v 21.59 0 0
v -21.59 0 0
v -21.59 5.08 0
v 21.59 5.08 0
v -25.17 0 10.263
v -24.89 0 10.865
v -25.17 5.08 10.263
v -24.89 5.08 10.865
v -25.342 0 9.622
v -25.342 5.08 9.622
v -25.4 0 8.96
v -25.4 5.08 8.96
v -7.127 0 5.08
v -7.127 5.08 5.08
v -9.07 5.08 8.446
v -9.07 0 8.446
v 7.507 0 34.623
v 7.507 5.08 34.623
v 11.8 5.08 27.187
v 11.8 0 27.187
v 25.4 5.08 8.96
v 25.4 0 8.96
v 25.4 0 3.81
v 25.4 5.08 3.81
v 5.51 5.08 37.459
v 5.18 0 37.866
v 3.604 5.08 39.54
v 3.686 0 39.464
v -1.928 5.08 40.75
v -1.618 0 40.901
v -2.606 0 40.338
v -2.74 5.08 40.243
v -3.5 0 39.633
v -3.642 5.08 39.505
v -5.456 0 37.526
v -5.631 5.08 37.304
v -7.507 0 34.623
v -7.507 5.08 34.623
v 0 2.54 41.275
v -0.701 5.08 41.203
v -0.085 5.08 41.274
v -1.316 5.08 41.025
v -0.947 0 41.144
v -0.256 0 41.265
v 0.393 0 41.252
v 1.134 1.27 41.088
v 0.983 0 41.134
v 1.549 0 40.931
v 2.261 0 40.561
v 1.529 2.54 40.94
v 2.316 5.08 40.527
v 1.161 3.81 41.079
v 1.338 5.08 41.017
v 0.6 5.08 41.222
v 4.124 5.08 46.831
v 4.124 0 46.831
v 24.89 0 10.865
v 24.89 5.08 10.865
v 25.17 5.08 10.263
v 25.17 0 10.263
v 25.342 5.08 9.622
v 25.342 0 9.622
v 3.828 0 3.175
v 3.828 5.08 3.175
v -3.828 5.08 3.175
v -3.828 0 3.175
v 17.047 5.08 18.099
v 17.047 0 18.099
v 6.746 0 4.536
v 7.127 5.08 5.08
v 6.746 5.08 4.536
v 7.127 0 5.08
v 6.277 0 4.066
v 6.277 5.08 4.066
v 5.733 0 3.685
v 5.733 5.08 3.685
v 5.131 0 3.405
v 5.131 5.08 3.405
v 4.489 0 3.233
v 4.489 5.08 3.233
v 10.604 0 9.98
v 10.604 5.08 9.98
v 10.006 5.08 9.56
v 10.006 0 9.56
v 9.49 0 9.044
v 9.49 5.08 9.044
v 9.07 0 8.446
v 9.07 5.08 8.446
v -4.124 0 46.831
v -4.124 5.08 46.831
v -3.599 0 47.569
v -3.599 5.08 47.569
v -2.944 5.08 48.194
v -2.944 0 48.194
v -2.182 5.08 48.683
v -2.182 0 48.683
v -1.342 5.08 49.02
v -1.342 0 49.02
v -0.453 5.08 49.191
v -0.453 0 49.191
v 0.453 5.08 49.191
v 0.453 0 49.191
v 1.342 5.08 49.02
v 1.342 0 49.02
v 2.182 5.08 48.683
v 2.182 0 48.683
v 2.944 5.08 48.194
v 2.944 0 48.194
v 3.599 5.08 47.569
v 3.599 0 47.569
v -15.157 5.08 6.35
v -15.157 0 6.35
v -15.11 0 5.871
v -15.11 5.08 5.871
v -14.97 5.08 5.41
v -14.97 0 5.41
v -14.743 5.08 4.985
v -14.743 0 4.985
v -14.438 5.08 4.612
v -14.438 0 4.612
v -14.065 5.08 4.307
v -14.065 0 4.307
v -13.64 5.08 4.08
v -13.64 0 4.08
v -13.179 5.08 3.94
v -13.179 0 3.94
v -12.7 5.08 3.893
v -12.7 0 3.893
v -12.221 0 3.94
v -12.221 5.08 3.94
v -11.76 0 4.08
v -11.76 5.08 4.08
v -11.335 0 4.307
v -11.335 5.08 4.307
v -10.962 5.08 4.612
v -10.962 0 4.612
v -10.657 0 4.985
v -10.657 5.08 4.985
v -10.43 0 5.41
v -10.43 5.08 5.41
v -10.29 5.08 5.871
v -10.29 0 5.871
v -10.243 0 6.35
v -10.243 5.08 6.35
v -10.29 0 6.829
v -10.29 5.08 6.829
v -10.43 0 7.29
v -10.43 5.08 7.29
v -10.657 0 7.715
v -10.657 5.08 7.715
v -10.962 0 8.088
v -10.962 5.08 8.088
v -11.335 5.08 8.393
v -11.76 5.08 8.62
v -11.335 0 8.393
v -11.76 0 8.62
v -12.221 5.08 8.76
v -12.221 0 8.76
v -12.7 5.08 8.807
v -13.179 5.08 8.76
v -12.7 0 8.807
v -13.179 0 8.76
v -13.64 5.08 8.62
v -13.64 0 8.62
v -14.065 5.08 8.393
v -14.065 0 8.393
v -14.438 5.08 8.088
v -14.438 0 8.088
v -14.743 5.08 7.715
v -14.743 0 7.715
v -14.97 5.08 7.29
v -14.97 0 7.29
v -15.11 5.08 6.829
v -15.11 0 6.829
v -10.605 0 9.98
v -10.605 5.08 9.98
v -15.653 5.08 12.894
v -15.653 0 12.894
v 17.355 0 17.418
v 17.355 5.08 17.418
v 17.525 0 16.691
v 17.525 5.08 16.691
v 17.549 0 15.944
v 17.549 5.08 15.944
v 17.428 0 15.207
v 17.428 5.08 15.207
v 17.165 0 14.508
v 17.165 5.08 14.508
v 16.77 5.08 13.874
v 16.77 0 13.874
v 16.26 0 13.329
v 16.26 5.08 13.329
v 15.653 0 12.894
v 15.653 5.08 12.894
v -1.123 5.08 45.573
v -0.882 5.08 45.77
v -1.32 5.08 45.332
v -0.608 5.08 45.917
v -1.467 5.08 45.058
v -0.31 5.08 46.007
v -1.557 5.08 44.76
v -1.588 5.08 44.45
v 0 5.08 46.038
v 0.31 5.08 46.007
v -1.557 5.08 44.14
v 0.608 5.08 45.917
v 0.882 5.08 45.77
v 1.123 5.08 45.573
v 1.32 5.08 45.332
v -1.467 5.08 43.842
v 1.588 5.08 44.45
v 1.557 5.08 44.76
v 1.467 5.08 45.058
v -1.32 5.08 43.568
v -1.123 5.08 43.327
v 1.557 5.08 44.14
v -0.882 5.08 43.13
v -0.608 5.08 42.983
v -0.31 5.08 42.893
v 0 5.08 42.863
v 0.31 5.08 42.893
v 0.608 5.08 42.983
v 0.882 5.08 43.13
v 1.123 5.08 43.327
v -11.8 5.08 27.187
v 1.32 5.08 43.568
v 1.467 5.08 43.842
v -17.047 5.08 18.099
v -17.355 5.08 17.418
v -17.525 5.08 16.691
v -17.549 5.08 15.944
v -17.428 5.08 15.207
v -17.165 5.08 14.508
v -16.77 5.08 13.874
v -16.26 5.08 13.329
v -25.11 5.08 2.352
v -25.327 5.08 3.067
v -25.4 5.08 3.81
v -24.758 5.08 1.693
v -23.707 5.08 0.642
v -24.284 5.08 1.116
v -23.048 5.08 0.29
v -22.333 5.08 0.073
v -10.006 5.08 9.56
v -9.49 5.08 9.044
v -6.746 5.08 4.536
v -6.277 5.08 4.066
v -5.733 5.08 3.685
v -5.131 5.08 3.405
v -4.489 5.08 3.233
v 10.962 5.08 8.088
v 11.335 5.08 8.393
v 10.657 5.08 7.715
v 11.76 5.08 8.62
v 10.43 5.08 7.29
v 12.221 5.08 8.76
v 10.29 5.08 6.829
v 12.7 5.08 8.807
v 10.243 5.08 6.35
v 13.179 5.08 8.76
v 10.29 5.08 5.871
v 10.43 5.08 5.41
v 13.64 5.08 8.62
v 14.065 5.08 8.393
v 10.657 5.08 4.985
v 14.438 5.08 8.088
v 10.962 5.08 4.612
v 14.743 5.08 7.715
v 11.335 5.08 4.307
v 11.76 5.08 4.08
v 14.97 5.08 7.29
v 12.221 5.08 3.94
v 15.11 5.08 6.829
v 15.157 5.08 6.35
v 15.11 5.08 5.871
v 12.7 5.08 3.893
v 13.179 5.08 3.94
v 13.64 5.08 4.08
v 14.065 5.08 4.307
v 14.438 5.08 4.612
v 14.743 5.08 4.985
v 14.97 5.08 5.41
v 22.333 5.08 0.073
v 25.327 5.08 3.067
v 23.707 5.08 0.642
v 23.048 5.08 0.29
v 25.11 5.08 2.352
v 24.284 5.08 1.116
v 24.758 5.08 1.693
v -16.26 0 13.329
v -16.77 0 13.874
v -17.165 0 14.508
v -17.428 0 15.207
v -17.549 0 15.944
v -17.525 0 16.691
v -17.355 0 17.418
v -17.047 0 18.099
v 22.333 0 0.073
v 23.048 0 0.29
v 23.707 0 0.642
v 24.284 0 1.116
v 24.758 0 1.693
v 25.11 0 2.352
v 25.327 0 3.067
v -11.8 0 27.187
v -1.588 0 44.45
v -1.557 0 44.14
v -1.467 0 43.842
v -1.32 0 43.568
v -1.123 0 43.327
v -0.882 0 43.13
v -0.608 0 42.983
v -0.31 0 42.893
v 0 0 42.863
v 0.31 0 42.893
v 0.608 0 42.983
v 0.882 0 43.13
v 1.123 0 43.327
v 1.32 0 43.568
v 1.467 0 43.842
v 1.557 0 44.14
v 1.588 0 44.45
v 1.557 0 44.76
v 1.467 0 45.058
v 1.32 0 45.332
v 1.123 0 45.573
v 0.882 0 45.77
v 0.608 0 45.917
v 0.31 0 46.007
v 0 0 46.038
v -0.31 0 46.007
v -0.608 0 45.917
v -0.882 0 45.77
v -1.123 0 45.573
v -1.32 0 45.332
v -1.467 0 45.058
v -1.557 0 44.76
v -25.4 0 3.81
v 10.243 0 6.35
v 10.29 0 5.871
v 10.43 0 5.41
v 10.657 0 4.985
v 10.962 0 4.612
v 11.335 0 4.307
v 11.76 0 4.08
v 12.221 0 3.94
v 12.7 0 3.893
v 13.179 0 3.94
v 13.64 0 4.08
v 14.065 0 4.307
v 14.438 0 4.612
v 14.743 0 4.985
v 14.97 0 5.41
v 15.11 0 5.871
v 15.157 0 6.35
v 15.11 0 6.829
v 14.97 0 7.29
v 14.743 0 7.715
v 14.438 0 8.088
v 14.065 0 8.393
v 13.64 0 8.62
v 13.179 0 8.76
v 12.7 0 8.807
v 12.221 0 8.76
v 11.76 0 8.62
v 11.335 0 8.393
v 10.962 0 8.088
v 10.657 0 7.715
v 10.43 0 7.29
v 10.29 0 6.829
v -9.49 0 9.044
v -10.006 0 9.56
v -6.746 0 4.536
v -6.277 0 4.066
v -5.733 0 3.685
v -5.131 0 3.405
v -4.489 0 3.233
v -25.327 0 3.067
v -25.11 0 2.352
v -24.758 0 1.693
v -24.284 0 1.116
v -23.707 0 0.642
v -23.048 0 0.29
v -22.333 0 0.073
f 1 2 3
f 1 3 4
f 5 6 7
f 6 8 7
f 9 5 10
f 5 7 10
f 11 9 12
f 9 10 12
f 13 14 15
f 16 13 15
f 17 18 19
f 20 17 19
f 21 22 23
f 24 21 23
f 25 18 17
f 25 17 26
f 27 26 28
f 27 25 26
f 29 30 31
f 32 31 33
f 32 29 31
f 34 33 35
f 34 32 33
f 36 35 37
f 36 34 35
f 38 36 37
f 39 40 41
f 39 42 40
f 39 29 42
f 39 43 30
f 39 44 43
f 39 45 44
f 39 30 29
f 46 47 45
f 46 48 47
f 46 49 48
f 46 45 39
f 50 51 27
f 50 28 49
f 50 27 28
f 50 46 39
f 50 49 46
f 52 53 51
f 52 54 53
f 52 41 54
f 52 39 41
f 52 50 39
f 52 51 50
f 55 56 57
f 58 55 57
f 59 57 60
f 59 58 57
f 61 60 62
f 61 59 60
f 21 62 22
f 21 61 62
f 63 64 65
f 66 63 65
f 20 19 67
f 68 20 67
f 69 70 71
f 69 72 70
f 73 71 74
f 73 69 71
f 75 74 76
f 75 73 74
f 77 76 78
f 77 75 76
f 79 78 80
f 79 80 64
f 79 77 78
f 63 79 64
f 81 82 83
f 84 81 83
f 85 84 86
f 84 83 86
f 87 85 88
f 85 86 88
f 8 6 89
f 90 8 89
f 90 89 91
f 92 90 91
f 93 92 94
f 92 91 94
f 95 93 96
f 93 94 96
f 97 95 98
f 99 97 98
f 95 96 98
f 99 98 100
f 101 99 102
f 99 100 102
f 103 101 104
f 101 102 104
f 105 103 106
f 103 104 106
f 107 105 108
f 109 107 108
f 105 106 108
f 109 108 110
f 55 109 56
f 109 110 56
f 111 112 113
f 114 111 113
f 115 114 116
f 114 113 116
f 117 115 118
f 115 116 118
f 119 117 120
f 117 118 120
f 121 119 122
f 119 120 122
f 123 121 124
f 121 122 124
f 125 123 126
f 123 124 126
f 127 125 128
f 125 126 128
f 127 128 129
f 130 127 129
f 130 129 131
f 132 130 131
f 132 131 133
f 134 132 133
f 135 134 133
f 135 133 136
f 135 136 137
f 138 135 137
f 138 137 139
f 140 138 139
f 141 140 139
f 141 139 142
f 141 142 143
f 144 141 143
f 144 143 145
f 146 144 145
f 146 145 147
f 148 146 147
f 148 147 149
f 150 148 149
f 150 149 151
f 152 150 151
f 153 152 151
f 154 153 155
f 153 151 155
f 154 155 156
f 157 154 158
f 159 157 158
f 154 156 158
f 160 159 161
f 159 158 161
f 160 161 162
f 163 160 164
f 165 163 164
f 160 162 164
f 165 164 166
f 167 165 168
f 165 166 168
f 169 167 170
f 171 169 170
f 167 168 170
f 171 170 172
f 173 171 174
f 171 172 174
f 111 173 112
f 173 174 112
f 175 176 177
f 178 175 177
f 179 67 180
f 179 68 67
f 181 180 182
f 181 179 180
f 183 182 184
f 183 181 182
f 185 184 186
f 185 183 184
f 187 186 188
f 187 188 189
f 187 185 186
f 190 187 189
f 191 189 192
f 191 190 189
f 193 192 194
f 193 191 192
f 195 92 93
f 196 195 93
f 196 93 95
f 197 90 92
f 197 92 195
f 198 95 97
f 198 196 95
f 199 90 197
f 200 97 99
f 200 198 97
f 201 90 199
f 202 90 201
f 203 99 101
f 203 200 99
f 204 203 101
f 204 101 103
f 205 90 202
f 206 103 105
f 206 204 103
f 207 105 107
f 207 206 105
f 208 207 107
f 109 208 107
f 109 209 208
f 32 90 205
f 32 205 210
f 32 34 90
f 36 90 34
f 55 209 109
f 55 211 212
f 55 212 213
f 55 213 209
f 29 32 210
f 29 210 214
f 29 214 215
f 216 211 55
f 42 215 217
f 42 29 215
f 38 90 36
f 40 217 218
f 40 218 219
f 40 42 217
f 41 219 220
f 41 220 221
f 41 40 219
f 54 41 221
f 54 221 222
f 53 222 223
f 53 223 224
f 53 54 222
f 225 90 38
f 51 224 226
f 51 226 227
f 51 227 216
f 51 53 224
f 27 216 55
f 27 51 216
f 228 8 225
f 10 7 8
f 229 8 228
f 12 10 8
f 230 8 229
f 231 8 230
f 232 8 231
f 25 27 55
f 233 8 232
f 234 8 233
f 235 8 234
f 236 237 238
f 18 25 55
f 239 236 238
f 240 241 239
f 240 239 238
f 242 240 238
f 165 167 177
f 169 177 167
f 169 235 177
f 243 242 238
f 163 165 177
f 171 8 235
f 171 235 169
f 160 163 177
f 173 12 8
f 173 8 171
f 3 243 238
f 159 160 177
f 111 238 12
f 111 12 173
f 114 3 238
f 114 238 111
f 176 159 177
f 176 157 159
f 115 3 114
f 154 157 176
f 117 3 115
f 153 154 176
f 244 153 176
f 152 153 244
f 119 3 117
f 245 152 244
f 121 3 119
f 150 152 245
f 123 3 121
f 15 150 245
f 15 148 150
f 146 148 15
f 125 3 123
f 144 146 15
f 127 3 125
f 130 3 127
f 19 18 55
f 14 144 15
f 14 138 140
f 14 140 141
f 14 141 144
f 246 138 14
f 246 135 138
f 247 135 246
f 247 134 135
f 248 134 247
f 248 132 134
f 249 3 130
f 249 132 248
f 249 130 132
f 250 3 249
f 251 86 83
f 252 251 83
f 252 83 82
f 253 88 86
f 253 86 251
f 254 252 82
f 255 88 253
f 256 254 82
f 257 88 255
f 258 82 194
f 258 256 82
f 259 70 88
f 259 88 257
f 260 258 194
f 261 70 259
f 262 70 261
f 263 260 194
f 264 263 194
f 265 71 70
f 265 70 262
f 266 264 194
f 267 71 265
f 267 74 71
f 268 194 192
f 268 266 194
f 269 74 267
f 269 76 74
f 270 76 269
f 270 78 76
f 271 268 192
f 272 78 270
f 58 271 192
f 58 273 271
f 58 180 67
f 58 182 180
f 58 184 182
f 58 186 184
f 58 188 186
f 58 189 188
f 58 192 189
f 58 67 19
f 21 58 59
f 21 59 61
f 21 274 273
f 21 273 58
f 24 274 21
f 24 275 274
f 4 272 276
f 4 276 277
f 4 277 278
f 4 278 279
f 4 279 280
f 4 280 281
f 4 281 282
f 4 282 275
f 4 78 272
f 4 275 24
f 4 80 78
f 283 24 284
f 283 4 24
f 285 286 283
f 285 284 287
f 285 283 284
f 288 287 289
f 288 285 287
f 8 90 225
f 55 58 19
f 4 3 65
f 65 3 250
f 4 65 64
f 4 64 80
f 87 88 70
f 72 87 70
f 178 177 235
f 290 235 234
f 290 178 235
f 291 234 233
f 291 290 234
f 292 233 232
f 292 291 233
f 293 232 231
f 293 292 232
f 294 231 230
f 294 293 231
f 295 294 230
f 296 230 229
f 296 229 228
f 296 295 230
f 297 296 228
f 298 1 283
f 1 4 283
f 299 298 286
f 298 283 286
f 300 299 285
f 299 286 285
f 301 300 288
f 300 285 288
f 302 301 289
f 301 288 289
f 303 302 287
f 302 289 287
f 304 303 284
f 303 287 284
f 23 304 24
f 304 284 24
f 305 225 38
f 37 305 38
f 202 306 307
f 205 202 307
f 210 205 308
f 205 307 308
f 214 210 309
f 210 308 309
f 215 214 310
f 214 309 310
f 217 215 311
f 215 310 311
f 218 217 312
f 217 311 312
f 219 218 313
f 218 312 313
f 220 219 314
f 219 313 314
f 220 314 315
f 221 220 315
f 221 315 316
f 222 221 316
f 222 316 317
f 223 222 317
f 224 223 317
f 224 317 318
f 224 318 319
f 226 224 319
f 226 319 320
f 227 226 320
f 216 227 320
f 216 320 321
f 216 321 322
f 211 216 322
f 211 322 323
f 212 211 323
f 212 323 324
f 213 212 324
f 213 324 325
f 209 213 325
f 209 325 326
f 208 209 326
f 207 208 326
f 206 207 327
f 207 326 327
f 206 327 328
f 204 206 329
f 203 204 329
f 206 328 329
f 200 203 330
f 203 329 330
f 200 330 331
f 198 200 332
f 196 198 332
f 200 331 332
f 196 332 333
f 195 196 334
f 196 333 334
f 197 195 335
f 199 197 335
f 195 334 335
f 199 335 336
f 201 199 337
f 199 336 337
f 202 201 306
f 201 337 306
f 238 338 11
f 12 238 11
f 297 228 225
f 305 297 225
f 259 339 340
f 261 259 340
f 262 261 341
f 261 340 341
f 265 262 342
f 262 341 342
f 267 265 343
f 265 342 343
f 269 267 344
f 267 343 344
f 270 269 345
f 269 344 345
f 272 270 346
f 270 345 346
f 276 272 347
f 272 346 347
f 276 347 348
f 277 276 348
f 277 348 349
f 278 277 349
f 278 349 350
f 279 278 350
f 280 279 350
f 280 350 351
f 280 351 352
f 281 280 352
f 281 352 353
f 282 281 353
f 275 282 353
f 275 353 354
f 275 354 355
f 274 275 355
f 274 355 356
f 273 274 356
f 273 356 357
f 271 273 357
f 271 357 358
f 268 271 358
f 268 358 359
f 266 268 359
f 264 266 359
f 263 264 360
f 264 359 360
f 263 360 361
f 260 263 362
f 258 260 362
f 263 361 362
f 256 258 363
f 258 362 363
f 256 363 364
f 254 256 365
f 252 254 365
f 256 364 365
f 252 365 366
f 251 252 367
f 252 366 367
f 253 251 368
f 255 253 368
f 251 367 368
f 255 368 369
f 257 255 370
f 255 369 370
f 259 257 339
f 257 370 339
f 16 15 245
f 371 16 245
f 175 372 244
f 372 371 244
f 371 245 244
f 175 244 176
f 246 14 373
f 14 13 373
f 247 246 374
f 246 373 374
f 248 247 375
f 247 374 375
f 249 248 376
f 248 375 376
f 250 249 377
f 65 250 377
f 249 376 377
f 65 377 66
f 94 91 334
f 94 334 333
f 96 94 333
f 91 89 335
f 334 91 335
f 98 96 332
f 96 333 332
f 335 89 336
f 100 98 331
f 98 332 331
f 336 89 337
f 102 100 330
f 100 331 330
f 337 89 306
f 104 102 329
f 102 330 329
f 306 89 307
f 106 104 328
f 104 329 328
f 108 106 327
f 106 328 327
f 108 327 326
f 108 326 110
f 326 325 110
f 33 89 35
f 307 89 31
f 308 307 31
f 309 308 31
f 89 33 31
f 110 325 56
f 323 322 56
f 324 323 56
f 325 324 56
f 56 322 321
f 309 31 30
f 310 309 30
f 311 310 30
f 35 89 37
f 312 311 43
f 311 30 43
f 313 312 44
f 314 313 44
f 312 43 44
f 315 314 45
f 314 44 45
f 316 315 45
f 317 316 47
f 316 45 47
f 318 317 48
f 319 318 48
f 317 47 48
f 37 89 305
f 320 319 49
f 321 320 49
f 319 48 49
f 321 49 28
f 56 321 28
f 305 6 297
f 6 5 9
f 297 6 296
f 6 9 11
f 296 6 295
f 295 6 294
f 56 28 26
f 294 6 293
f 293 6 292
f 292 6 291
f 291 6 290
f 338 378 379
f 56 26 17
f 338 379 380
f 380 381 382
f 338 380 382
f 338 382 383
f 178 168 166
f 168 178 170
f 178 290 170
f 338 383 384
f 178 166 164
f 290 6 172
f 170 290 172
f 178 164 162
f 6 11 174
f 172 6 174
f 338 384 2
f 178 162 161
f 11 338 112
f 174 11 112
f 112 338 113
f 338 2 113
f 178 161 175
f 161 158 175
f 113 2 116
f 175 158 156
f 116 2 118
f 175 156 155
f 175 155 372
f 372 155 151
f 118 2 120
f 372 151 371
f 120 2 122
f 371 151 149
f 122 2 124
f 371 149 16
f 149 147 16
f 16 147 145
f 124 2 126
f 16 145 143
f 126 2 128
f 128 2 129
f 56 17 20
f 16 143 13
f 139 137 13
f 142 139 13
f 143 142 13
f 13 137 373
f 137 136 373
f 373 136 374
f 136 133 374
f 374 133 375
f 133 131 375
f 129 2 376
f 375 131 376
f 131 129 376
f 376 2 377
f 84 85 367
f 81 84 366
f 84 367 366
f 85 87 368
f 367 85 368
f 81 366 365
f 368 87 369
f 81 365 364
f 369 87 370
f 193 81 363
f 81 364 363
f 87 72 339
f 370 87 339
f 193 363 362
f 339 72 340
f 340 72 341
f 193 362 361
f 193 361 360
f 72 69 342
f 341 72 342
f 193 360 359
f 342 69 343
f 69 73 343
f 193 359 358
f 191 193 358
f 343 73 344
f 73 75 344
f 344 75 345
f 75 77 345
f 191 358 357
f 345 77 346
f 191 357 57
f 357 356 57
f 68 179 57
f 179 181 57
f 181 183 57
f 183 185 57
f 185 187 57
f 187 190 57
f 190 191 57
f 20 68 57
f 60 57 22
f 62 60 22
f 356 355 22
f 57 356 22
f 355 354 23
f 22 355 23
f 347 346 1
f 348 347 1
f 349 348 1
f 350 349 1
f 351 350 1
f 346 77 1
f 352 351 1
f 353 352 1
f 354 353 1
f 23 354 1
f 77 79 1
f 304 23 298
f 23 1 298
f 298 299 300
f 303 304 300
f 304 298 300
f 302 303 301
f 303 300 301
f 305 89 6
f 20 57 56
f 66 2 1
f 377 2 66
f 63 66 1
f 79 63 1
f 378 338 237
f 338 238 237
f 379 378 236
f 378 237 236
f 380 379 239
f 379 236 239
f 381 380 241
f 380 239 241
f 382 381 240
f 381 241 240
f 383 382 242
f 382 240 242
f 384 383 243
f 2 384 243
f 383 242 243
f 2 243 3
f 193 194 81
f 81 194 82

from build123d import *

# Parameters (mm, degrees)
SKETCH1_W                    = 50.8
SKETCH1_H                    = 6.35
BOSS_EXTRUDE1_DEPTH          = 5.08
F_10_0_1935_DIAMETER_HOLE1_D = 4.9149
F_1_8_0_1250_DOWEL_HOLE1_D   = 3.175
CUT_EXTRUDE1_DEPTH           = 56.613276798
FILLET1_R                    = 3.81


with BuildPart() as part:
    # Sketch1 → Boss-Extrude1 (new body)
    with BuildSketch(Plane(origin=(0, 0, 0), x_dir=(1, 0, 0), z_dir=(0, 1, 0))):
        with BuildLine():
            Line((25.4, -6.35), (-25.4, -6.35))
            Line((-25.4, -6.35), (-25.4, -9.980909488))
            Line((-25.4, -9.980909488), (-4.124445986, -46.83125))
            ThreePointArc((-4.124445986, -46.83125), (0, -49.2125), (4.124445986, -46.83125))
            Line((4.124445986, -46.83125), (25.4, -9.980909488))
            Line((25.4, -9.980909488), (25.4, -6.35))
        make_face()
        with Locations((0, -3.175)):
            Rectangle(SKETCH1_W, SKETCH1_H)
    extrude(amount=BOSS_EXTRUDE1_DEPTH)

    # #10 (0.1935) Diameter Hole1 (through all)
    with Locations(Plane(origin=(0, 5.08, 0), x_dir=(1, 0, 0), z_dir=(0, 1, 0))):
        with Locations((-12.7, -6.35), (12.7, -6.35)):
            Hole(F_10_0_1935_DIAMETER_HOLE1_D / 2)

    # 1/8 (0.1250) Dowel Hole1 (through all)
    with Locations(Plane(origin=(0, 5.08, 0), x_dir=(1, 0, 0), z_dir=(0, 1, 0))):
        with Locations((0, -44.45)):
            Hole(F_1_8_0_1250_DOWEL_HOLE1_D / 2)

    # Sketch4 → Cut-Extrude1 (cut, through all)
    with BuildSketch(Plane(origin=(0, 5.08, 0), x_dir=(1, 0, 0), z_dir=(0, 1, 0))):
        with BuildLine():
            Line((-6.027562939, -3.175), (-9.070487533, -8.4455))
            ThreePointArc((-9.070487533, -8.4455), (-9.73651548, -9.31348452), (-10.6045, -9.979512467))
            Line((-10.6045, -9.979512467), (-18.952099271, -14.799001153))
            Line((-18.952099271, -14.799001153), (-11.799907664, -27.186960401))
            Line((-11.799907664, -27.186960401), (-7.506626388, -34.623141702))
            add(Edge.make_bspline(
                [(7.506626388, -34.623141702), (5.246523419, -38.15236124), (0, -44.39763876), (-5.246523419, -38.15236124), (-7.506626388, -34.623141702)],
                knots=[0.213351666, 0.213351666, 0.213351666, 0.213351666, 0.5, 0.786648334, 0.786648334, 0.786648334, 0.786648334], degree=3))
            Line((7.506626388, -34.623141702), (11.799907664, -27.186960401))
            Line((11.799907664, -27.186960401), (18.952099271, -14.799001153))
            Line((18.952099271, -14.799001153), (10.6045, -9.979512467))
            ThreePointArc((10.6045, -9.979512467), (9.73651548, -9.31348452), (9.070487533, -8.4455))
            Line((9.070487533, -8.4455), (6.027562939, -3.175))
            Line((6.027562939, -3.175), (-6.027562939, -3.175))
        make_face()
    extrude(amount=-CUT_EXTRUDE1_DEPTH, mode=Mode.SUBTRACT)

    # Fillet1
    fillet1_edges = [part.edges().sort_by_distance(p)[0] for p in [
        (-25.4, 2.54, 9.980909488),
        (-25.4, 2.54, 0),
        (25.4, 2.54, 0),
        (25.4, 2.54, 9.980909488),
        (-18.952099271, 2.54, 14.799001153),
        (-6.027562939, 2.54, 3.175),
        (6.027562939, 2.54, 3.175),
        (18.952099271, 2.54, 14.799001153),
    ]]
    fillet(fillet1_edges, radius=FILLET1_R)


solid = part.part
